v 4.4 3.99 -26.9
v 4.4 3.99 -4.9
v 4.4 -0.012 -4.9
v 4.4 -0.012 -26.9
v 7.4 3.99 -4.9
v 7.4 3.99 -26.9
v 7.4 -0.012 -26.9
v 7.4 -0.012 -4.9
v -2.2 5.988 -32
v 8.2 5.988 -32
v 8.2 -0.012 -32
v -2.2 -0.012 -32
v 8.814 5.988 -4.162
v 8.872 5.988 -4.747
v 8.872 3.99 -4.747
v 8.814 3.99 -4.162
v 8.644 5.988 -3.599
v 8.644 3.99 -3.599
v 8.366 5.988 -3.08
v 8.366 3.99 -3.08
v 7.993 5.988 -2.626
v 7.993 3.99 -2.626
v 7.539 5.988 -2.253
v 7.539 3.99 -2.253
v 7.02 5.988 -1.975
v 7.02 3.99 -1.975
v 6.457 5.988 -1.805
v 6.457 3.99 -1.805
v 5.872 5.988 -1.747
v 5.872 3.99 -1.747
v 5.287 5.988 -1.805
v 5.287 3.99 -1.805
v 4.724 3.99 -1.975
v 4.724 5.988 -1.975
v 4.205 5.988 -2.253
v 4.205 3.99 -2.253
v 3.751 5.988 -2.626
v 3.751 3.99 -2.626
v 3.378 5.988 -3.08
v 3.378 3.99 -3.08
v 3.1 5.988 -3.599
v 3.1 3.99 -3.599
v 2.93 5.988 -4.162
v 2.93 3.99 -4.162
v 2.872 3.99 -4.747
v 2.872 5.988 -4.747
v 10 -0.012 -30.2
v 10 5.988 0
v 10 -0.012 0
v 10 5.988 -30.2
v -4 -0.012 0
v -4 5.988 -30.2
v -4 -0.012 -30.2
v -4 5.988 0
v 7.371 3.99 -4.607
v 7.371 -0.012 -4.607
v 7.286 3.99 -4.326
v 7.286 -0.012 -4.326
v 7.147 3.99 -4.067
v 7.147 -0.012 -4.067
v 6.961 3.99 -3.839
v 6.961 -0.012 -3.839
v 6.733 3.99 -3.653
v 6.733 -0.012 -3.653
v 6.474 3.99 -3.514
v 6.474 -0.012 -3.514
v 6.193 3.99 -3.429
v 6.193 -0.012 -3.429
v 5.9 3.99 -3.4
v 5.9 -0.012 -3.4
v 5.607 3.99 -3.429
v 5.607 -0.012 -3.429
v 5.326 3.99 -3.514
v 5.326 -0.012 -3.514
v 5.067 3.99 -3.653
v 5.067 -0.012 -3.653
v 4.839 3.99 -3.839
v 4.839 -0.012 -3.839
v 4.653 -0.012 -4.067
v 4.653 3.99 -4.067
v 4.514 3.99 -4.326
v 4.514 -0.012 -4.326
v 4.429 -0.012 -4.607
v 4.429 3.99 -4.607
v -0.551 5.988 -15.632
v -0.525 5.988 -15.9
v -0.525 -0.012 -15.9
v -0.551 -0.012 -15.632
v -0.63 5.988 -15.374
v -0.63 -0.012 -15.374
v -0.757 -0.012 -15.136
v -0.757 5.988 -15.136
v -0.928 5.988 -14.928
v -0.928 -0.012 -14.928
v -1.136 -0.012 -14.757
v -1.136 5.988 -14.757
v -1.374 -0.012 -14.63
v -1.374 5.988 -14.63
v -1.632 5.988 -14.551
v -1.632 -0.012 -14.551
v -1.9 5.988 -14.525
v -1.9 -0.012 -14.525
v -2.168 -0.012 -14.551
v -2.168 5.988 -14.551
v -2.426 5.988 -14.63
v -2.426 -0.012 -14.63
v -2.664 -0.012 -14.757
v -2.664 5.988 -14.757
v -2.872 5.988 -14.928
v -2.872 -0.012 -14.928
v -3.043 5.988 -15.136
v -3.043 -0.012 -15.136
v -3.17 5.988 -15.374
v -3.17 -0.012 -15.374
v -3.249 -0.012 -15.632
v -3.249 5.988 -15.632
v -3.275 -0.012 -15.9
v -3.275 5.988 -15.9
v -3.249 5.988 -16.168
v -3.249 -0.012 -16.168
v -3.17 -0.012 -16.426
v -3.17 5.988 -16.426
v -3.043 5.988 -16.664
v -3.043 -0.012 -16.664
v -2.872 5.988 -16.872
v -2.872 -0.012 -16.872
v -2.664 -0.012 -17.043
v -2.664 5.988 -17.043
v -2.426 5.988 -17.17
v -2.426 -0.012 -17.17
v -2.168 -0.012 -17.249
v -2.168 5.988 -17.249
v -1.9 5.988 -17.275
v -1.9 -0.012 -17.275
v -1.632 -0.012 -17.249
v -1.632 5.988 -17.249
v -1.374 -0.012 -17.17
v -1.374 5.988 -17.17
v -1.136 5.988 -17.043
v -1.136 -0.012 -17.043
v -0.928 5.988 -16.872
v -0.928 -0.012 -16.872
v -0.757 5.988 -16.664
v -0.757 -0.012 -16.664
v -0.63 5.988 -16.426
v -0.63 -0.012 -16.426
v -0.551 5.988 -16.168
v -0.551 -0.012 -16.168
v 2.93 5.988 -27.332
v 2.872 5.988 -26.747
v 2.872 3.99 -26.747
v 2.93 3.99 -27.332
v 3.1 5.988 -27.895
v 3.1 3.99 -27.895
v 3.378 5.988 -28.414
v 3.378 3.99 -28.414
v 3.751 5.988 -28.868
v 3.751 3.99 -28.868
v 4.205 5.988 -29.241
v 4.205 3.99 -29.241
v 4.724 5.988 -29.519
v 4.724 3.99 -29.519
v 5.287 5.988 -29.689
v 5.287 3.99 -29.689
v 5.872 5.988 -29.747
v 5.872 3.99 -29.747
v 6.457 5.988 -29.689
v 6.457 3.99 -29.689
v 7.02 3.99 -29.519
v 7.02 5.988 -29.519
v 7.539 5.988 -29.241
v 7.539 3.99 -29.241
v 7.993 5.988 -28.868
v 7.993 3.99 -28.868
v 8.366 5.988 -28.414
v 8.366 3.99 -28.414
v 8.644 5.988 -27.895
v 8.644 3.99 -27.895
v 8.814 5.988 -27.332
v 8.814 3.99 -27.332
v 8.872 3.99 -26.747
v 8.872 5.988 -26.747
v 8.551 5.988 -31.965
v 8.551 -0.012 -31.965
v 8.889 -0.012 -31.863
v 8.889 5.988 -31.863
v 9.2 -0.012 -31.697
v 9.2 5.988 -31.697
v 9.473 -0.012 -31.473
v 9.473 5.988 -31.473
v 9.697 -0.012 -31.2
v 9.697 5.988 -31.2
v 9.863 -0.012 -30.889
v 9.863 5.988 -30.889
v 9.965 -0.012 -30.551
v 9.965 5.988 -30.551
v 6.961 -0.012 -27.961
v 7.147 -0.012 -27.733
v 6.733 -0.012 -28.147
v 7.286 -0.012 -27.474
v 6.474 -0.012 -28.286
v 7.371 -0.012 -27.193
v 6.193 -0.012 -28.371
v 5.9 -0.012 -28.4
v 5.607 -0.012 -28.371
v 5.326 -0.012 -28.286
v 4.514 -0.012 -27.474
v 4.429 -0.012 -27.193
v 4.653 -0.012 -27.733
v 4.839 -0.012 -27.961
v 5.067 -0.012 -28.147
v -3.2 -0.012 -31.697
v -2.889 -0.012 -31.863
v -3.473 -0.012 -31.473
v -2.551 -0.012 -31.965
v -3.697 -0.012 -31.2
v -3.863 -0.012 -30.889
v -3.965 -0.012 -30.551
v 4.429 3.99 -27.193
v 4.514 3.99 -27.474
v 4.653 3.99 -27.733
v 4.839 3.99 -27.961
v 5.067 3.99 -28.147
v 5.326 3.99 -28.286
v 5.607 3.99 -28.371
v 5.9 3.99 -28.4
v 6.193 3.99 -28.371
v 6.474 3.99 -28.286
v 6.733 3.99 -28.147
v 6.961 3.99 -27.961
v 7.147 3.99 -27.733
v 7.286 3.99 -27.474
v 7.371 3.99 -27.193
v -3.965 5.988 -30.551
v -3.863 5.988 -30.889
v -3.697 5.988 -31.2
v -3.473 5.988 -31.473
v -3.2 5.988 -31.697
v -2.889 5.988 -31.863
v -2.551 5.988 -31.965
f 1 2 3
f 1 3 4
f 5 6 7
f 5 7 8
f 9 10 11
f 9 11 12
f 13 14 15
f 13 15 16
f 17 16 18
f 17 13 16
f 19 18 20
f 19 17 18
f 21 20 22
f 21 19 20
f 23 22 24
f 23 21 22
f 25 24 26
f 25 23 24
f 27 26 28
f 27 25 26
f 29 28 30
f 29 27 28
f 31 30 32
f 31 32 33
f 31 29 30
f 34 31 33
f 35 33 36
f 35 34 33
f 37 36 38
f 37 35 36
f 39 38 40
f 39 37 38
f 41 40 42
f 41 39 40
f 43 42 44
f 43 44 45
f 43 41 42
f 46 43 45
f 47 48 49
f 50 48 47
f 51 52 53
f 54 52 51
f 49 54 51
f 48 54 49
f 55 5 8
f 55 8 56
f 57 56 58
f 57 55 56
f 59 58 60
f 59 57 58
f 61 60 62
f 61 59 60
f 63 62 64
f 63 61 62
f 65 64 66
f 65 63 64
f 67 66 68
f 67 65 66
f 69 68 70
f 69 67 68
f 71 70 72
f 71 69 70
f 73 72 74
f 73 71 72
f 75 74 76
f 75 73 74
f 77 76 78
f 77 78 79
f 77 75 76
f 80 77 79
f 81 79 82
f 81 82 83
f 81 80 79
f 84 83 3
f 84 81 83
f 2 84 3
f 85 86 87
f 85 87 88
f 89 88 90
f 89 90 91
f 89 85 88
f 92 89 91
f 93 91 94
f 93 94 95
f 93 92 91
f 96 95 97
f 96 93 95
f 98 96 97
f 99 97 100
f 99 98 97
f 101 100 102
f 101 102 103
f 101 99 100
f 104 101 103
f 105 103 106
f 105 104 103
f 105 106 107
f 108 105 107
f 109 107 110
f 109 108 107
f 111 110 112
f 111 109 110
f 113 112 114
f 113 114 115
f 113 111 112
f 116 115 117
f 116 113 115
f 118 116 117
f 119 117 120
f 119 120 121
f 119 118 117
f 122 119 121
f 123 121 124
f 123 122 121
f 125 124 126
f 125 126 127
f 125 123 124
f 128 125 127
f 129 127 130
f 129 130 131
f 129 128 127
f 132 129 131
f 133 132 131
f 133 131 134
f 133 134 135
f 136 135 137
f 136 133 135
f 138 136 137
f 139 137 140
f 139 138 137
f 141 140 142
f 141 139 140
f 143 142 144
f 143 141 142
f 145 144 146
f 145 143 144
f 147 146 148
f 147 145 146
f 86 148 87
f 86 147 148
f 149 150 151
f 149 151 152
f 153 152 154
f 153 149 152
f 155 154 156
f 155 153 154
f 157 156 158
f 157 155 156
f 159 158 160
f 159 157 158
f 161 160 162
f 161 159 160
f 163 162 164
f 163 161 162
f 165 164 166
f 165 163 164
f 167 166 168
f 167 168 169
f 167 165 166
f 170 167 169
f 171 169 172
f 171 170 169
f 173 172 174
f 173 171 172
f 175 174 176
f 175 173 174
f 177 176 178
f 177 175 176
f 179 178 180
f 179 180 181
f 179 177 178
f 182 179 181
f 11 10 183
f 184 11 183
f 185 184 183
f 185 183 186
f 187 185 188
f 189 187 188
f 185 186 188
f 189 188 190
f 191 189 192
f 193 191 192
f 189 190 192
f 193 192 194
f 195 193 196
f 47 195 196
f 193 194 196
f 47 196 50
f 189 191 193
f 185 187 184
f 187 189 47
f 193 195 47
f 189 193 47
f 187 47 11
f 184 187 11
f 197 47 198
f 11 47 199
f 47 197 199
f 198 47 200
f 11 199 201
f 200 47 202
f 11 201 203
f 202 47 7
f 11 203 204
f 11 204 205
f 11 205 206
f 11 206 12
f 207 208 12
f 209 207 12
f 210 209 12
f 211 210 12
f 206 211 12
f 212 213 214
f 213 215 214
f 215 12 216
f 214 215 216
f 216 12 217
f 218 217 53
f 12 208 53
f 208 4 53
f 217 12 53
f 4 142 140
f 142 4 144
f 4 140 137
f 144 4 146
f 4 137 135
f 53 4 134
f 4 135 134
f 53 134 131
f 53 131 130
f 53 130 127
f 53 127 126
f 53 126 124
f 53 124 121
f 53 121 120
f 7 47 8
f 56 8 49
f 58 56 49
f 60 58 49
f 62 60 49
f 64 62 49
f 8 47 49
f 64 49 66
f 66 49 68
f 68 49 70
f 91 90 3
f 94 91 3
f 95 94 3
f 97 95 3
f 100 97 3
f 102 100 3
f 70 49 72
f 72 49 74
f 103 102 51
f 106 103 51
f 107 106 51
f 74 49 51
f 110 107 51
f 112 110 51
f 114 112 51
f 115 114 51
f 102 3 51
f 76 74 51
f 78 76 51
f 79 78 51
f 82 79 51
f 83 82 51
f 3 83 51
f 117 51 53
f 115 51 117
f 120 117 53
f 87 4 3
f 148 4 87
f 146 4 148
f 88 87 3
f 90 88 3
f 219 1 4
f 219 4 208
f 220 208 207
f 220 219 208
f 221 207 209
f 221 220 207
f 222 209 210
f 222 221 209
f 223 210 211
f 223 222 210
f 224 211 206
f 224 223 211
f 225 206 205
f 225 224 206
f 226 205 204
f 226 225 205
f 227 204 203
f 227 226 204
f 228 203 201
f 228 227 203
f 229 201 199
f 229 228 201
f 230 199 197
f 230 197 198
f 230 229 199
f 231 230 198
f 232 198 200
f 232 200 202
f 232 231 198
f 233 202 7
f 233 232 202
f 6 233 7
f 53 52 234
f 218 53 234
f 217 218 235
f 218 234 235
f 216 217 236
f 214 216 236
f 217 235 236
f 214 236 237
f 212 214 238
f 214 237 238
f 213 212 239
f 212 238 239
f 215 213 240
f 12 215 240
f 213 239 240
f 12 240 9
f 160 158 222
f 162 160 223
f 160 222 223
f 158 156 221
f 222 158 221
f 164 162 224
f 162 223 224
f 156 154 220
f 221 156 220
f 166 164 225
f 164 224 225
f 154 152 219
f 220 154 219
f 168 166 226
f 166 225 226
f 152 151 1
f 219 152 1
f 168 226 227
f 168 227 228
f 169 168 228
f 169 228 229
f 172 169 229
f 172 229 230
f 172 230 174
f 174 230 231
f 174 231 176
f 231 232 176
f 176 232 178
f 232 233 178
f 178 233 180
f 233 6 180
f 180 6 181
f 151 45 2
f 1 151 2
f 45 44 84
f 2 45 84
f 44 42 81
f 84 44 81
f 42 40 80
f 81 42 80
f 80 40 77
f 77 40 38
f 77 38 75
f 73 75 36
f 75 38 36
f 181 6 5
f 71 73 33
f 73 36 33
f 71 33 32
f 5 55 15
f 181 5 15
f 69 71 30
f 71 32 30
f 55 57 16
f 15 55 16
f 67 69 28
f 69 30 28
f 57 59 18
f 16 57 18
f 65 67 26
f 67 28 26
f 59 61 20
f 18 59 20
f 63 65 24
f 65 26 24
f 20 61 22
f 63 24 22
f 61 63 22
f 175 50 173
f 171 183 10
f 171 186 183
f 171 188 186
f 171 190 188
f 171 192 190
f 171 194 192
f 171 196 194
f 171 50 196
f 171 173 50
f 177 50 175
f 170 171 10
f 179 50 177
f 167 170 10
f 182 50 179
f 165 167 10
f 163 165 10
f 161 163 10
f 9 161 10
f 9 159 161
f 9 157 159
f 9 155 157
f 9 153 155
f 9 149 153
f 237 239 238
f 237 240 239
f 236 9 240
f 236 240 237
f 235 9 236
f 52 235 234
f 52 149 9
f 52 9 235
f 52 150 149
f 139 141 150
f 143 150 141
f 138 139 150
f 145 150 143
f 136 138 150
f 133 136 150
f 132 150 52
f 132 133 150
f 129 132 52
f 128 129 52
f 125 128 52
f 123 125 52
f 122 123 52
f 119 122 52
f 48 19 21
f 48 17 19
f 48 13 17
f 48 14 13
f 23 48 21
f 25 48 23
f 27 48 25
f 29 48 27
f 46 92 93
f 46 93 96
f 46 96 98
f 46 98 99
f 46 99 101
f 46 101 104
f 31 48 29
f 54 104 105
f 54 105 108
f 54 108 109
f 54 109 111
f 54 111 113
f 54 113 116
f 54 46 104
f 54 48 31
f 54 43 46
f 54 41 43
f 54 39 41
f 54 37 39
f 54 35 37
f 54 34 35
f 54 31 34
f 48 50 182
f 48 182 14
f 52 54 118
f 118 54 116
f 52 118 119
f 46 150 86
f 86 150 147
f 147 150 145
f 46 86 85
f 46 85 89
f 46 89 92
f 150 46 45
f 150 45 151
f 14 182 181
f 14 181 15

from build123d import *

# Parameters (mm, degrees)
PAD007_DEPTH = 2
SKETCH012_R  = 1.375
PAD004_DEPTH = 6


with BuildPart() as slotscrew:
    # Sketch020 → Pad007 (new body)
    with BuildSketch(Plane.XZ):
        with BuildLine():
            ThreePointArc((8.9, 35), (5.9, 38), (2.9, 35))
            Line((2.9, 35), (2.9, 13))
            ThreePointArc((2.9, 13), (5.9, 10), (8.9, 13))
            Line((8.9, 13), (8.9, 35))
        make_face()
    extrude(amount=PAD007_DEPTH)


with BuildPart() as slotscrew_1:
    # Body009 placement: moved
    add(slotscrew.part.moved(Location((-0.028, 0.002, -39.747))))


with BuildPart() as base:
    # Sketch012 → Pad004 (new body)
    with BuildSketch(Plane.XZ):
        with BuildLine():
            Line((-4, 0), (10, 0))
            Line((10, 0), (10, -30.2))
            ThreePointArc((8.2, -32), (9.472792, -31.472792), (10, -30.2))
            Line((8.2, -32), (-2.2, -32))
            ThreePointArc((-4, -30.2), (-3.472792, -31.472792), (-2.2, -32))
            Line((-4, -30.2), (-4, 0))
        make_face()
        with Locations((-1.9, -15.9)):
            Circle(SKETCH012_R, mode=Mode.SUBTRACT)
        with BuildLine():
            ThreePointArc((4.4, -26.9), (5.9, -28.4), (7.4, -26.9))
            Line((7.4, -26.9), (7.4, -4.9))
            ThreePointArc((7.4, -4.9), (5.9, -3.4), (4.4, -4.9))
            Line((4.4, -4.9), (4.4, -26.9))
        make_face(mode=Mode.SUBTRACT)
    extrude(amount=PAD004_DEPTH)

    # Cut044: cut slotscrew
    add(slotscrew_1.part, mode=Mode.SUBTRACT)


with BuildPart() as base_1:
    # Cut044 placement: moved
    add(base.part.moved(Location((0, 5.988, 0))))


solid = base_1.part
